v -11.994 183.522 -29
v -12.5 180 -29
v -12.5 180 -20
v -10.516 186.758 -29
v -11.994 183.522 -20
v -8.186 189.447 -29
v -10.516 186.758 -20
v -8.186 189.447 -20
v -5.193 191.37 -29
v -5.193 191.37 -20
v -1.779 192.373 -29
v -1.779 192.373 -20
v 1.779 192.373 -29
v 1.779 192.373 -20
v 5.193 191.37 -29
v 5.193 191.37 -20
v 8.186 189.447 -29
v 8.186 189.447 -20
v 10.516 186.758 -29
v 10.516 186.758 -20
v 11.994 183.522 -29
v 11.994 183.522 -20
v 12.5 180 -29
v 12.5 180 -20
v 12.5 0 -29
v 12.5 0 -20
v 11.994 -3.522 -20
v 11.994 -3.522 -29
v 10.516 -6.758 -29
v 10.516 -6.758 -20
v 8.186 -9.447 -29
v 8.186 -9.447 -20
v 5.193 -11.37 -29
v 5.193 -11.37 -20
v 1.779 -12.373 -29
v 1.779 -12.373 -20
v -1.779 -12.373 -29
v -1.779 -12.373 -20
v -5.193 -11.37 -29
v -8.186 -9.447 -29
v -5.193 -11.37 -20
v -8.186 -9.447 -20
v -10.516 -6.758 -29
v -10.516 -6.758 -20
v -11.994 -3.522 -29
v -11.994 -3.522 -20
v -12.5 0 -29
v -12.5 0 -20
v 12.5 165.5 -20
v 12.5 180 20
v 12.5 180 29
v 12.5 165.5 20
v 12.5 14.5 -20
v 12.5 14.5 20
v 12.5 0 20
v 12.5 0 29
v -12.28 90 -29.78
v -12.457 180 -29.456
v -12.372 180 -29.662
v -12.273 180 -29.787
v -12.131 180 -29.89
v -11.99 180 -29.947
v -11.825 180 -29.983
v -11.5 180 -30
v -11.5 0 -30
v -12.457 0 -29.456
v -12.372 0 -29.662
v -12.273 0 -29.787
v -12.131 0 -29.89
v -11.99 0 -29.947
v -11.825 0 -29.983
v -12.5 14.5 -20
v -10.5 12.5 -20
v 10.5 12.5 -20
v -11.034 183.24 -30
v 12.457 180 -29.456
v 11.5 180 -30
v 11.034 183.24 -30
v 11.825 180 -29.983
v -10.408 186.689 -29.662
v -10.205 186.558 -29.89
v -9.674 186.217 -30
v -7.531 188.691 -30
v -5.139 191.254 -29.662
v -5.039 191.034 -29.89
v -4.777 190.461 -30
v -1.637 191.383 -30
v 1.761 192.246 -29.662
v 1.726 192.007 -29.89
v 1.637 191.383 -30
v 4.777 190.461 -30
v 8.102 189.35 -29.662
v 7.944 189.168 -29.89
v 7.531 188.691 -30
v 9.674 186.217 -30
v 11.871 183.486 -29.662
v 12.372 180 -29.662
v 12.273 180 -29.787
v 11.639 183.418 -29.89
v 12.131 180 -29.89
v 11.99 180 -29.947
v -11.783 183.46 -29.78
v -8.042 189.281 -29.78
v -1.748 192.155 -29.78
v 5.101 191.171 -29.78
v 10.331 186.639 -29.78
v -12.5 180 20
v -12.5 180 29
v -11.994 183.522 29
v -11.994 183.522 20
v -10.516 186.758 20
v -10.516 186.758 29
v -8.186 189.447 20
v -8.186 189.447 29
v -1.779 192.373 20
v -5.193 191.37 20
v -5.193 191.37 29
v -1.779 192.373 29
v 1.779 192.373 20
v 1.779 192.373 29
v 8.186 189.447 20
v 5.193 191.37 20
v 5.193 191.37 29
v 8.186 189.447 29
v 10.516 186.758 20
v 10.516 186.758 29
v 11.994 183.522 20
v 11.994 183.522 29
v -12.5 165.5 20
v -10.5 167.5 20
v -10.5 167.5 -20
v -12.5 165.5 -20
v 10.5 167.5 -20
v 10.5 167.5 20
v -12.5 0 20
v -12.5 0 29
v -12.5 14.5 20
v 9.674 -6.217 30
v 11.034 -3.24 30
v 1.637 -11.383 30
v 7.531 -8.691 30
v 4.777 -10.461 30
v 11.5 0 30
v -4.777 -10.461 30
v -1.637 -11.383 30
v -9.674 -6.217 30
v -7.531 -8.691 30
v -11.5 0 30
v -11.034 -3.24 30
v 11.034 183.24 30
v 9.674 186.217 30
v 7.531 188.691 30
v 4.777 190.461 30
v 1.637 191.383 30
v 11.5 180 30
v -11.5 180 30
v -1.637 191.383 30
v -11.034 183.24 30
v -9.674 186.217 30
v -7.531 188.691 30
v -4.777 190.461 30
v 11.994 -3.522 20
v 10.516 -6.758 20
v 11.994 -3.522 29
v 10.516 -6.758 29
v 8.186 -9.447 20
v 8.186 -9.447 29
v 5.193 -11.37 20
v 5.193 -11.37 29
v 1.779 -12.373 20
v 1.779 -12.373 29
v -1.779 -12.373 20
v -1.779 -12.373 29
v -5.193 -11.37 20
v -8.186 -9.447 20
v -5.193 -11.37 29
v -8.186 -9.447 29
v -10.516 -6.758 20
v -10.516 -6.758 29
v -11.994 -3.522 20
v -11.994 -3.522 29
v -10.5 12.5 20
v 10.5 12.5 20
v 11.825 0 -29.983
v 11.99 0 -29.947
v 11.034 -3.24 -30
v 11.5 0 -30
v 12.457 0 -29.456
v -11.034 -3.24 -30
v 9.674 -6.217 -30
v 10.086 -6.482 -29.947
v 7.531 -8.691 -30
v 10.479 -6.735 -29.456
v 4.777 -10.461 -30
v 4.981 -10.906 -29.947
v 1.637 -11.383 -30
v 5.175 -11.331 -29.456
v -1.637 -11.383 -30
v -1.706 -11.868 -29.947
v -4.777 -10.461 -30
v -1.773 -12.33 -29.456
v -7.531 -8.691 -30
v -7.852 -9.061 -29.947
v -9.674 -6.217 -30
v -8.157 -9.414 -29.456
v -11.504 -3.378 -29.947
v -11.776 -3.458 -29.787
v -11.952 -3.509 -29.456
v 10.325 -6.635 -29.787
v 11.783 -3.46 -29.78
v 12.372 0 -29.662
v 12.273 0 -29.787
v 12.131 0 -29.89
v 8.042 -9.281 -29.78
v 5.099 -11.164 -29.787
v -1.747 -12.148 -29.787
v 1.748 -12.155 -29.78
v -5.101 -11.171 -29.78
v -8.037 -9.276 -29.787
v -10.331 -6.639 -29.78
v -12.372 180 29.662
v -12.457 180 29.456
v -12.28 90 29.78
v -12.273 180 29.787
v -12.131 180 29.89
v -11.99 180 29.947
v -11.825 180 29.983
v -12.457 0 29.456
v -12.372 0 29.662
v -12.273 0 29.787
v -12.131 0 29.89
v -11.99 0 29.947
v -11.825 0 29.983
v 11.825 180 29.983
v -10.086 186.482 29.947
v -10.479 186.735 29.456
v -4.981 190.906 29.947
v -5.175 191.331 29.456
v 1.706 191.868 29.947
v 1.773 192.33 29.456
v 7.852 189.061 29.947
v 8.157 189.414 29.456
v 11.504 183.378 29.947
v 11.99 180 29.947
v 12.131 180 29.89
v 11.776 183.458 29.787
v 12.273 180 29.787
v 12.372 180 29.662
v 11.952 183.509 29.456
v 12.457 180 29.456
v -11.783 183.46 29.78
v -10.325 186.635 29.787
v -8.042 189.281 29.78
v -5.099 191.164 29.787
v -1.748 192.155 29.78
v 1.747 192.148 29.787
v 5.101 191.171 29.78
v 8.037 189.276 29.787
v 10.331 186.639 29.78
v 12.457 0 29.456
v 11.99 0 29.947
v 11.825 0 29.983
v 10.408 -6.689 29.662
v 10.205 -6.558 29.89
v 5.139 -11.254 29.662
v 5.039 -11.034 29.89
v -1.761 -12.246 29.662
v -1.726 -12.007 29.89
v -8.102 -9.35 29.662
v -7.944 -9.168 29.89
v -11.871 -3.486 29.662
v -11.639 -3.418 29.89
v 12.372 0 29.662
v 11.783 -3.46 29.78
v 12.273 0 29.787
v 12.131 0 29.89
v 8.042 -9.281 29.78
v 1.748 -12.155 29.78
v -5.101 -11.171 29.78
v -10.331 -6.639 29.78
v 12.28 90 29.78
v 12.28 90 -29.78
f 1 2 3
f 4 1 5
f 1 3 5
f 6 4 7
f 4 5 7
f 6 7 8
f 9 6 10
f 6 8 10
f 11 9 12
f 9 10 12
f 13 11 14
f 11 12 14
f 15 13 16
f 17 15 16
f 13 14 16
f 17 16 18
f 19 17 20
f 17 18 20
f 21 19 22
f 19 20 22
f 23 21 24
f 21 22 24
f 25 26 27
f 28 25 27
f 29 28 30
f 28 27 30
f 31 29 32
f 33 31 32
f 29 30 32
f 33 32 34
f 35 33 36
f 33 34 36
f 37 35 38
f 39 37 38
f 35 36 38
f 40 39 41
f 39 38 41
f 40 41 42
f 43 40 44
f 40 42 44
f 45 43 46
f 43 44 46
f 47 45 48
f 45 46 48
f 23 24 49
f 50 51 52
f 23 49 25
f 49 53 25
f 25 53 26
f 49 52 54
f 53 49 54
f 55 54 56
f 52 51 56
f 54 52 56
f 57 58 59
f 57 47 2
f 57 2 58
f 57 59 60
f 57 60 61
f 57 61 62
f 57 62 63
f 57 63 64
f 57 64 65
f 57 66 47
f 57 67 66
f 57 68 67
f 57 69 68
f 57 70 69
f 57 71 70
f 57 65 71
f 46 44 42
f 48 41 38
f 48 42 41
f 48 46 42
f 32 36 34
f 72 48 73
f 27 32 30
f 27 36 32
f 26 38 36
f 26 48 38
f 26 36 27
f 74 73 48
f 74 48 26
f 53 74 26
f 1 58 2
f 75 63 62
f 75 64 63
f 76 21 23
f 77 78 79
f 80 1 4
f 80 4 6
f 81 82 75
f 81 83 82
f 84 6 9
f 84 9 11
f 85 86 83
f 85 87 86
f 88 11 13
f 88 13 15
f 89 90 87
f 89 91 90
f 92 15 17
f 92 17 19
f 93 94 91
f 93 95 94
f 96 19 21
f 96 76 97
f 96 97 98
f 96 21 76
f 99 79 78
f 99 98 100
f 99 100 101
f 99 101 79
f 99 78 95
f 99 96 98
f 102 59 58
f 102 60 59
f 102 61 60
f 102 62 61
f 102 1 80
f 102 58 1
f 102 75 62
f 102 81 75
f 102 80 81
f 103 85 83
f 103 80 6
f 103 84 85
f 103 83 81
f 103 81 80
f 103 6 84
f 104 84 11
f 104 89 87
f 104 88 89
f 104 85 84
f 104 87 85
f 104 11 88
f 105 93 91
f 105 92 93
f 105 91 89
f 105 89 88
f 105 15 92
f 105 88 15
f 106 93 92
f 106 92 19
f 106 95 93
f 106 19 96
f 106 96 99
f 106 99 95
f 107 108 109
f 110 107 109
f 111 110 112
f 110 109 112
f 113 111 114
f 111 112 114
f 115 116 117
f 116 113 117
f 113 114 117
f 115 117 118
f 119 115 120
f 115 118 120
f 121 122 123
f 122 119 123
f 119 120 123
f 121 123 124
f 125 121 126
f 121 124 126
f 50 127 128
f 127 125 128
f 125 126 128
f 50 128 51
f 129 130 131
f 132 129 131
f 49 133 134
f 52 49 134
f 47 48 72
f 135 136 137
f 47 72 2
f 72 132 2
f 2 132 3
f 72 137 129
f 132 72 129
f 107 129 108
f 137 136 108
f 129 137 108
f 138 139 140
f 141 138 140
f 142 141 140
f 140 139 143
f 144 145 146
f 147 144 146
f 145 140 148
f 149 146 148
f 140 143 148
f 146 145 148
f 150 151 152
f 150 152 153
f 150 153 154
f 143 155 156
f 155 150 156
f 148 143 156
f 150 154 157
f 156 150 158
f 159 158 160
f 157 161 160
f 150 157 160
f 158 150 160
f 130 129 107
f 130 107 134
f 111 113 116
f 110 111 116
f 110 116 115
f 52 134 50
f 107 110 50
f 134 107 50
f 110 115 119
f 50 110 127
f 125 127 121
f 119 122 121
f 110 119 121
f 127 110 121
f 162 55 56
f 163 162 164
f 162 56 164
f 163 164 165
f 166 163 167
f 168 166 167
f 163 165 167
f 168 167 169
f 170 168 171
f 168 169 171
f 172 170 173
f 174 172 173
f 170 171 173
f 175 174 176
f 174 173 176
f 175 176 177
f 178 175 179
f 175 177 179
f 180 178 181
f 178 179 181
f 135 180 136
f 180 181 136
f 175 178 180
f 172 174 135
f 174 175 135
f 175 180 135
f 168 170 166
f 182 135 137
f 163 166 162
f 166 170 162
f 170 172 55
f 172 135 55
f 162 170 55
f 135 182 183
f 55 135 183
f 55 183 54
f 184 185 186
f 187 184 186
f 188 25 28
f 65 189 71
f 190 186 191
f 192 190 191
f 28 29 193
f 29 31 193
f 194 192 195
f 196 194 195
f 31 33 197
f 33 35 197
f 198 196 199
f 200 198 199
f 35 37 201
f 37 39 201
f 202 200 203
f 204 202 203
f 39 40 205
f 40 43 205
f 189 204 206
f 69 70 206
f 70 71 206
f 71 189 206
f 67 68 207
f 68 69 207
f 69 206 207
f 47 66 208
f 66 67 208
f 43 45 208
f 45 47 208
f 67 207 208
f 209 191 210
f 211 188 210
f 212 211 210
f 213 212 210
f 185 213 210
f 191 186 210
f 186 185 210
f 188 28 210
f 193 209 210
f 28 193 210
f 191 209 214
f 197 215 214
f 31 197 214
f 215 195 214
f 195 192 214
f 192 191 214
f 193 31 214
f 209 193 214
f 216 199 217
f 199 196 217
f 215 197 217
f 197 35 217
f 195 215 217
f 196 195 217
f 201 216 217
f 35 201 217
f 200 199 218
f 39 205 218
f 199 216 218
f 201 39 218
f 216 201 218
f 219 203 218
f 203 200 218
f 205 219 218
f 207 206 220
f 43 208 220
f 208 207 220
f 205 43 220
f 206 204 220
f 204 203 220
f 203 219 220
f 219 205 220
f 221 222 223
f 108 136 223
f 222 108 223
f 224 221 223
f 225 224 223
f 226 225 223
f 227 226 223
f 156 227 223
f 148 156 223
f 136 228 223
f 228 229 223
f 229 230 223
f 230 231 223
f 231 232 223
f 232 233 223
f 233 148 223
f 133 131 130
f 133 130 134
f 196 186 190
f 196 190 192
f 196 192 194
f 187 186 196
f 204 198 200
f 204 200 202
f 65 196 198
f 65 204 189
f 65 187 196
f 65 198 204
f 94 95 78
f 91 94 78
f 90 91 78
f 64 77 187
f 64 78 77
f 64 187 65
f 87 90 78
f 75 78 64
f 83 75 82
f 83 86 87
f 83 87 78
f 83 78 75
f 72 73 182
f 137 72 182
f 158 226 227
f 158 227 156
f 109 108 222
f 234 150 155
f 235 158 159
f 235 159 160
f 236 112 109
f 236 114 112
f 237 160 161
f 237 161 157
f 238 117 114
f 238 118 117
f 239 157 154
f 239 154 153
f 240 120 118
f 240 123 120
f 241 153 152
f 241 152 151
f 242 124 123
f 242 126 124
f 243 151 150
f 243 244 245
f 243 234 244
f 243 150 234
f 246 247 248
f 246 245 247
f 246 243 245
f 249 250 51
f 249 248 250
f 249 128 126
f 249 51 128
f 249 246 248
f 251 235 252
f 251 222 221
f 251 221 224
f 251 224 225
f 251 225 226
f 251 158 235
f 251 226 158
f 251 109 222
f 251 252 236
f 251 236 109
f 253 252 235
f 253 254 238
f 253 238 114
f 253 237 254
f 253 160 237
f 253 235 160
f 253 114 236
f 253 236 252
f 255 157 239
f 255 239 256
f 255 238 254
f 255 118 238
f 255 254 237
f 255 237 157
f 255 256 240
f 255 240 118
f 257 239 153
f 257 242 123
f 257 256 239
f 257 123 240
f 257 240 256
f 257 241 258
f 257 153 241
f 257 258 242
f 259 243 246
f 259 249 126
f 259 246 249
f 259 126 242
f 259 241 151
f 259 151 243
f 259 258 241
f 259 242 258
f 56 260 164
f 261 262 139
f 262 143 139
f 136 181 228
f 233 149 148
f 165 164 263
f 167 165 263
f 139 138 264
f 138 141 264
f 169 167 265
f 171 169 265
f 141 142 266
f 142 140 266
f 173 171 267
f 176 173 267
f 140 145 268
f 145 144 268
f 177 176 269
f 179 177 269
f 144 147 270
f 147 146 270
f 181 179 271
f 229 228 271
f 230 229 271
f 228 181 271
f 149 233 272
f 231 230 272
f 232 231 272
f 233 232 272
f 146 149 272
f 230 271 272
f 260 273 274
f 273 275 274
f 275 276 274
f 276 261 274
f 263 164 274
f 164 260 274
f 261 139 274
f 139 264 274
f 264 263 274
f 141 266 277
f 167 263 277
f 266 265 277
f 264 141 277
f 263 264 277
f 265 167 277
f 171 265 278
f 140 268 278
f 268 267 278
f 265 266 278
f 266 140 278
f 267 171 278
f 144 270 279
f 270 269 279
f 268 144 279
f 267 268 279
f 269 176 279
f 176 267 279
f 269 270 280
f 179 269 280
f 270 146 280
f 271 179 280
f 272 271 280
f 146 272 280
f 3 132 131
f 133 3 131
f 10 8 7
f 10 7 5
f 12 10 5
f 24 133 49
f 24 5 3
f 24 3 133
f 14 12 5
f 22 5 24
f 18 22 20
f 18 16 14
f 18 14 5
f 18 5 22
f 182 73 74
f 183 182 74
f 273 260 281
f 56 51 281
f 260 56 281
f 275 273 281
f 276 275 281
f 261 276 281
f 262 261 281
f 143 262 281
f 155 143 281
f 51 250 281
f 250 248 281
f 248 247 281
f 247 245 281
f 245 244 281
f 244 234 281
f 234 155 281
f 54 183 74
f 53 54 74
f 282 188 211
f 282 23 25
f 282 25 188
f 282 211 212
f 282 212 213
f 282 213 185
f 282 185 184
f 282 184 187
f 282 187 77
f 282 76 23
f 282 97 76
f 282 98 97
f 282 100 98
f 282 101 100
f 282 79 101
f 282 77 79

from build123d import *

# Parameters (mm, degrees)
EXTRUDE_1_DEPTH     = 30
SKETCH_2_W          = 46.70760299
SKETCH_2_H          = 25
SKETCH_2_W_2        = 54.68279318
CUT_EXTRUDE_1_DEPTH = 20
CHAMFER_1_SIZE      = 2
FILLET_1_SIZE       = 1


with BuildPart() as part:
    # 草图1 → 凸台-拉伸1 (new, symmetric)
    with BuildSketch(Plane.XY):
        with BuildLine():
            Line((-12.5, 0), (-12.5, 180))
            ThreePointArc((-12.5, 180), (0, 192.5), (12.5, 180))
            Line((12.5, 180), (12.5, 0))
            ThreePointArc((12.5, 0), (0, -12.5), (-12.5, 0))
        make_face()
    extrude(amount=EXTRUDE_1_DEPTH, both=True)

    # 草图2 → 切除-拉伸1 (cut, symmetric)
    with BuildSketch(Plane.XY):
        Rectangle(SKETCH_2_W, SKETCH_2_H)
        with Locations((0, 180)):
            Rectangle(SKETCH_2_W_2, SKETCH_2_H)
    extrude(amount=CUT_EXTRUDE_1_DEPTH, both=True, mode=Mode.SUBTRACT)

    # 倒角1
    chamfer_1_edges = [part.edges().sort_by_distance(p)[0] for p in [
        (-12.5, 167.5, 0),
        (-12.5, 12.5, 0),
        (12.5, 12.5, 0),
        (12.5, 167.5, 0),
    ]]
    chamfer(chamfer_1_edges, length=CHAMFER_1_SIZE)

    # 圆角1
    # a fillet whose section is not a circle: 1 mm, written as the material it takes off along each edge
    with BuildSketch(Plane(origin=(-12.5, 0, 30), x_dir=(0, 0, -1), z_dir=(0, 1, 0)), Plane(origin=(12.5, 180, 30), x_dir=(0, 0, -1), z_dir=(0, -1, 0))) as fillet_1_piece_1:
        with BuildLine():
            add(Edge.make_bspline([(FILLET_1_SIZE, 0), (FILLET_1_SIZE * 0.831801948466, 0), (FILLET_1_SIZE * 0.663603896932, 0), (FILLET_1_SIZE * 0.292893218813, -FILLET_1_SIZE * 0.0716919198361), (FILLET_1_SIZE * 0.0716919198361, -FILLET_1_SIZE * 0.292893218813), (0, -FILLET_1_SIZE * 0.663603896932), (0, -FILLET_1_SIZE * 0.831801948466), (0, -FILLET_1_SIZE)], knots=[0, 0, 0, 0, 0, 0, 0.5, 0.5, 1, 1, 1, 1, 1, 1], degree=5))
            Line((0, -FILLET_1_SIZE), (-FILLET_1_SIZE * 0.02, -FILLET_1_SIZE))
            Line((-FILLET_1_SIZE * 0.02, -FILLET_1_SIZE), (-FILLET_1_SIZE * 0.02, FILLET_1_SIZE * 0.02))
            Line((-FILLET_1_SIZE * 0.02, FILLET_1_SIZE * 0.02), (FILLET_1_SIZE, FILLET_1_SIZE * 0.02))
            Line((FILLET_1_SIZE, FILLET_1_SIZE * 0.02), (FILLET_1_SIZE, 0))
        make_face()
    extrude(amount=180, mode=Mode.SUBTRACT)
    with BuildSketch(Plane(origin=(0, 180, 30), x_dir=(-1, 0, 0), z_dir=(0, -1, 0))) as fillet_1_piece_2:
        with BuildLine():
            add(Edge.make_bspline([(12.5 - FILLET_1_SIZE, 0), (12.5 - FILLET_1_SIZE * 0.831801948466, 0), (12.5 - FILLET_1_SIZE * 0.663603896932, 0), (12.5 - FILLET_1_SIZE * 0.292893218813, FILLET_1_SIZE * 0.0716919198361), (12.5 - FILLET_1_SIZE * 0.0716919198361, FILLET_1_SIZE * 0.292893218813), (12.5, FILLET_1_SIZE * 0.663603896932), (12.5, FILLET_1_SIZE * 0.831801948466), (12.5, FILLET_1_SIZE)], knots=[0, 0, 0, 0, 0, 0, 0.5, 0.5, 1, 1, 1, 1, 1, 1], degree=5))
            Line((12.5, FILLET_1_SIZE), (12.5 + FILLET_1_SIZE * 0.02, FILLET_1_SIZE))
            Line((12.5 + FILLET_1_SIZE * 0.02, FILLET_1_SIZE), (12.5 + FILLET_1_SIZE * 0.02, -FILLET_1_SIZE * 0.02))
            Line((12.5 + FILLET_1_SIZE * 0.02, -FILLET_1_SIZE * 0.02), (12.5 - FILLET_1_SIZE, -FILLET_1_SIZE * 0.02))
            Line((12.5 - FILLET_1_SIZE, -FILLET_1_SIZE * 0.02), (12.5 - FILLET_1_SIZE, 0))
        make_face()
    revolve(axis=Axis((0, 180, 30), (0, 0, -1)), revolution_arc=180, mode=Mode.SUBTRACT)
    with BuildSketch(Plane(origin=(0, 0, 30), x_dir=(1, 0, 0), z_dir=(0, 1, 0))) as fillet_1_piece_3:
        with BuildLine():
            add(Edge.make_bspline([(12.5, FILLET_1_SIZE), (12.5, FILLET_1_SIZE * 0.831801948466), (12.5, FILLET_1_SIZE * 0.663603896932), (12.5 - FILLET_1_SIZE * 0.0716919198361, FILLET_1_SIZE * 0.292893218813), (12.5 - FILLET_1_SIZE * 0.292893218813, FILLET_1_SIZE * 0.0716919198361), (12.5 - FILLET_1_SIZE * 0.663603896932, 0), (12.5 - FILLET_1_SIZE * 0.831801948466, 0), (12.5 - FILLET_1_SIZE, 0)], knots=[0, 0, 0, 0, 0, 0, 0.5, 0.5, 1, 1, 1, 1, 1, 1], degree=5))
            Line((12.5 - FILLET_1_SIZE, 0), (12.5 - FILLET_1_SIZE, -FILLET_1_SIZE * 0.02))
            Line((12.5 - FILLET_1_SIZE, -FILLET_1_SIZE * 0.02), (12.5 + FILLET_1_SIZE * 0.02, -FILLET_1_SIZE * 0.02))
            Line((12.5 + FILLET_1_SIZE * 0.02, -FILLET_1_SIZE * 0.02), (12.5 + FILLET_1_SIZE * 0.02, FILLET_1_SIZE))
            Line((12.5 + FILLET_1_SIZE * 0.02, FILLET_1_SIZE), (12.5, FILLET_1_SIZE))
        make_face()
    revolve(axis=Axis((0, 0, 30), (0, 0, -1)), revolution_arc=180, mode=Mode.SUBTRACT)
    with BuildSketch(Plane(origin=(12.5, 180, -30), x_dir=(0, 0, 1), z_dir=(0, -1, 0)), Plane(origin=(-12.5, 0, -30), x_dir=(0, 0, 1), z_dir=(0, 1, 0))) as fillet_1_piece_4:
        with BuildLine():
            add(Edge.make_bspline([(FILLET_1_SIZE, 0), (FILLET_1_SIZE * 0.831801948466, 0), (FILLET_1_SIZE * 0.663603896932, 0), (FILLET_1_SIZE * 0.292893218813, FILLET_1_SIZE * 0.0716919198361), (FILLET_1_SIZE * 0.0716919198361, FILLET_1_SIZE * 0.292893218813), (0, FILLET_1_SIZE * 0.663603896932), (0, FILLET_1_SIZE * 0.831801948466), (0, FILLET_1_SIZE)], knots=[0, 0, 0, 0, 0, 0, 0.5, 0.5, 1, 1, 1, 1, 1, 1], degree=5))
            Line((0, FILLET_1_SIZE), (-FILLET_1_SIZE * 0.02, FILLET_1_SIZE))
            Line((-FILLET_1_SIZE * 0.02, FILLET_1_SIZE), (-FILLET_1_SIZE * 0.02, -FILLET_1_SIZE * 0.02))
            Line((-FILLET_1_SIZE * 0.02, -FILLET_1_SIZE * 0.02), (FILLET_1_SIZE, -FILLET_1_SIZE * 0.02))
            Line((FILLET_1_SIZE, -FILLET_1_SIZE * 0.02), (FILLET_1_SIZE, 0))
        make_face()
    extrude(amount=180, mode=Mode.SUBTRACT)
    with BuildSketch(Plane(origin=(0, 180, -30), x_dir=(-1, 0, 0), z_dir=(0, -1, 0))) as fillet_1_piece_5:
        with BuildLine():
            add(Edge.make_bspline([(12.5, -FILLET_1_SIZE), (12.5, -FILLET_1_SIZE * 0.831801948466), (12.5, -FILLET_1_SIZE * 0.663603896932), (12.5 - FILLET_1_SIZE * 0.0716919198361, -FILLET_1_SIZE * 0.292893218813), (12.5 - FILLET_1_SIZE * 0.292893218813, -FILLET_1_SIZE * 0.0716919198361), (12.5 - FILLET_1_SIZE * 0.663603896932, 0), (12.5 - FILLET_1_SIZE * 0.831801948466, 0), (12.5 - FILLET_1_SIZE, 0)], knots=[0, 0, 0, 0, 0, 0, 0.5, 0.5, 1, 1, 1, 1, 1, 1], degree=5))
            Line((12.5 - FILLET_1_SIZE, 0), (12.5 - FILLET_1_SIZE, FILLET_1_SIZE * 0.02))
            Line((12.5 - FILLET_1_SIZE, FILLET_1_SIZE * 0.02), (12.5 + FILLET_1_SIZE * 0.02, FILLET_1_SIZE * 0.02))
            Line((12.5 + FILLET_1_SIZE * 0.02, FILLET_1_SIZE * 0.02), (12.5 + FILLET_1_SIZE * 0.02, -FILLET_1_SIZE))
            Line((12.5 + FILLET_1_SIZE * 0.02, -FILLET_1_SIZE), (12.5, -FILLET_1_SIZE))
        make_face()
    revolve(axis=Axis((0, 180, -30), (0, 0, -1)), revolution_arc=180, mode=Mode.SUBTRACT)
    with BuildSketch(Plane(origin=(0, 0, -30), x_dir=(1, 0, 0), z_dir=(0, 1, 0))) as fillet_1_piece_6:
        with BuildLine():
            add(Edge.make_bspline([(12.5 - FILLET_1_SIZE, 0), (12.5 - FILLET_1_SIZE * 0.831801948466, 0), (12.5 - FILLET_1_SIZE * 0.663603896932, 0), (12.5 - FILLET_1_SIZE * 0.292893218813, -FILLET_1_SIZE * 0.0716919198361), (12.5 - FILLET_1_SIZE * 0.0716919198361, -FILLET_1_SIZE * 0.292893218813), (12.5, -FILLET_1_SIZE * 0.663603896932), (12.5, -FILLET_1_SIZE * 0.831801948466), (12.5, -FILLET_1_SIZE)], knots=[0, 0, 0, 0, 0, 0, 0.5, 0.5, 1, 1, 1, 1, 1, 1], degree=5))
            Line((12.5, -FILLET_1_SIZE), (12.5 + FILLET_1_SIZE * 0.02, -FILLET_1_SIZE))
            Line((12.5 + FILLET_1_SIZE * 0.02, -FILLET_1_SIZE), (12.5 + FILLET_1_SIZE * 0.02, FILLET_1_SIZE * 0.02))
            Line((12.5 + FILLET_1_SIZE * 0.02, FILLET_1_SIZE * 0.02), (12.5 - FILLET_1_SIZE, FILLET_1_SIZE * 0.02))
            Line((12.5 - FILLET_1_SIZE, FILLET_1_SIZE * 0.02), (12.5 - FILLET_1_SIZE, 0))
        make_face()
    revolve(axis=Axis((0, 0, -30), (0, 0, -1)), revolution_arc=180, mode=Mode.SUBTRACT)


solid = part.part
